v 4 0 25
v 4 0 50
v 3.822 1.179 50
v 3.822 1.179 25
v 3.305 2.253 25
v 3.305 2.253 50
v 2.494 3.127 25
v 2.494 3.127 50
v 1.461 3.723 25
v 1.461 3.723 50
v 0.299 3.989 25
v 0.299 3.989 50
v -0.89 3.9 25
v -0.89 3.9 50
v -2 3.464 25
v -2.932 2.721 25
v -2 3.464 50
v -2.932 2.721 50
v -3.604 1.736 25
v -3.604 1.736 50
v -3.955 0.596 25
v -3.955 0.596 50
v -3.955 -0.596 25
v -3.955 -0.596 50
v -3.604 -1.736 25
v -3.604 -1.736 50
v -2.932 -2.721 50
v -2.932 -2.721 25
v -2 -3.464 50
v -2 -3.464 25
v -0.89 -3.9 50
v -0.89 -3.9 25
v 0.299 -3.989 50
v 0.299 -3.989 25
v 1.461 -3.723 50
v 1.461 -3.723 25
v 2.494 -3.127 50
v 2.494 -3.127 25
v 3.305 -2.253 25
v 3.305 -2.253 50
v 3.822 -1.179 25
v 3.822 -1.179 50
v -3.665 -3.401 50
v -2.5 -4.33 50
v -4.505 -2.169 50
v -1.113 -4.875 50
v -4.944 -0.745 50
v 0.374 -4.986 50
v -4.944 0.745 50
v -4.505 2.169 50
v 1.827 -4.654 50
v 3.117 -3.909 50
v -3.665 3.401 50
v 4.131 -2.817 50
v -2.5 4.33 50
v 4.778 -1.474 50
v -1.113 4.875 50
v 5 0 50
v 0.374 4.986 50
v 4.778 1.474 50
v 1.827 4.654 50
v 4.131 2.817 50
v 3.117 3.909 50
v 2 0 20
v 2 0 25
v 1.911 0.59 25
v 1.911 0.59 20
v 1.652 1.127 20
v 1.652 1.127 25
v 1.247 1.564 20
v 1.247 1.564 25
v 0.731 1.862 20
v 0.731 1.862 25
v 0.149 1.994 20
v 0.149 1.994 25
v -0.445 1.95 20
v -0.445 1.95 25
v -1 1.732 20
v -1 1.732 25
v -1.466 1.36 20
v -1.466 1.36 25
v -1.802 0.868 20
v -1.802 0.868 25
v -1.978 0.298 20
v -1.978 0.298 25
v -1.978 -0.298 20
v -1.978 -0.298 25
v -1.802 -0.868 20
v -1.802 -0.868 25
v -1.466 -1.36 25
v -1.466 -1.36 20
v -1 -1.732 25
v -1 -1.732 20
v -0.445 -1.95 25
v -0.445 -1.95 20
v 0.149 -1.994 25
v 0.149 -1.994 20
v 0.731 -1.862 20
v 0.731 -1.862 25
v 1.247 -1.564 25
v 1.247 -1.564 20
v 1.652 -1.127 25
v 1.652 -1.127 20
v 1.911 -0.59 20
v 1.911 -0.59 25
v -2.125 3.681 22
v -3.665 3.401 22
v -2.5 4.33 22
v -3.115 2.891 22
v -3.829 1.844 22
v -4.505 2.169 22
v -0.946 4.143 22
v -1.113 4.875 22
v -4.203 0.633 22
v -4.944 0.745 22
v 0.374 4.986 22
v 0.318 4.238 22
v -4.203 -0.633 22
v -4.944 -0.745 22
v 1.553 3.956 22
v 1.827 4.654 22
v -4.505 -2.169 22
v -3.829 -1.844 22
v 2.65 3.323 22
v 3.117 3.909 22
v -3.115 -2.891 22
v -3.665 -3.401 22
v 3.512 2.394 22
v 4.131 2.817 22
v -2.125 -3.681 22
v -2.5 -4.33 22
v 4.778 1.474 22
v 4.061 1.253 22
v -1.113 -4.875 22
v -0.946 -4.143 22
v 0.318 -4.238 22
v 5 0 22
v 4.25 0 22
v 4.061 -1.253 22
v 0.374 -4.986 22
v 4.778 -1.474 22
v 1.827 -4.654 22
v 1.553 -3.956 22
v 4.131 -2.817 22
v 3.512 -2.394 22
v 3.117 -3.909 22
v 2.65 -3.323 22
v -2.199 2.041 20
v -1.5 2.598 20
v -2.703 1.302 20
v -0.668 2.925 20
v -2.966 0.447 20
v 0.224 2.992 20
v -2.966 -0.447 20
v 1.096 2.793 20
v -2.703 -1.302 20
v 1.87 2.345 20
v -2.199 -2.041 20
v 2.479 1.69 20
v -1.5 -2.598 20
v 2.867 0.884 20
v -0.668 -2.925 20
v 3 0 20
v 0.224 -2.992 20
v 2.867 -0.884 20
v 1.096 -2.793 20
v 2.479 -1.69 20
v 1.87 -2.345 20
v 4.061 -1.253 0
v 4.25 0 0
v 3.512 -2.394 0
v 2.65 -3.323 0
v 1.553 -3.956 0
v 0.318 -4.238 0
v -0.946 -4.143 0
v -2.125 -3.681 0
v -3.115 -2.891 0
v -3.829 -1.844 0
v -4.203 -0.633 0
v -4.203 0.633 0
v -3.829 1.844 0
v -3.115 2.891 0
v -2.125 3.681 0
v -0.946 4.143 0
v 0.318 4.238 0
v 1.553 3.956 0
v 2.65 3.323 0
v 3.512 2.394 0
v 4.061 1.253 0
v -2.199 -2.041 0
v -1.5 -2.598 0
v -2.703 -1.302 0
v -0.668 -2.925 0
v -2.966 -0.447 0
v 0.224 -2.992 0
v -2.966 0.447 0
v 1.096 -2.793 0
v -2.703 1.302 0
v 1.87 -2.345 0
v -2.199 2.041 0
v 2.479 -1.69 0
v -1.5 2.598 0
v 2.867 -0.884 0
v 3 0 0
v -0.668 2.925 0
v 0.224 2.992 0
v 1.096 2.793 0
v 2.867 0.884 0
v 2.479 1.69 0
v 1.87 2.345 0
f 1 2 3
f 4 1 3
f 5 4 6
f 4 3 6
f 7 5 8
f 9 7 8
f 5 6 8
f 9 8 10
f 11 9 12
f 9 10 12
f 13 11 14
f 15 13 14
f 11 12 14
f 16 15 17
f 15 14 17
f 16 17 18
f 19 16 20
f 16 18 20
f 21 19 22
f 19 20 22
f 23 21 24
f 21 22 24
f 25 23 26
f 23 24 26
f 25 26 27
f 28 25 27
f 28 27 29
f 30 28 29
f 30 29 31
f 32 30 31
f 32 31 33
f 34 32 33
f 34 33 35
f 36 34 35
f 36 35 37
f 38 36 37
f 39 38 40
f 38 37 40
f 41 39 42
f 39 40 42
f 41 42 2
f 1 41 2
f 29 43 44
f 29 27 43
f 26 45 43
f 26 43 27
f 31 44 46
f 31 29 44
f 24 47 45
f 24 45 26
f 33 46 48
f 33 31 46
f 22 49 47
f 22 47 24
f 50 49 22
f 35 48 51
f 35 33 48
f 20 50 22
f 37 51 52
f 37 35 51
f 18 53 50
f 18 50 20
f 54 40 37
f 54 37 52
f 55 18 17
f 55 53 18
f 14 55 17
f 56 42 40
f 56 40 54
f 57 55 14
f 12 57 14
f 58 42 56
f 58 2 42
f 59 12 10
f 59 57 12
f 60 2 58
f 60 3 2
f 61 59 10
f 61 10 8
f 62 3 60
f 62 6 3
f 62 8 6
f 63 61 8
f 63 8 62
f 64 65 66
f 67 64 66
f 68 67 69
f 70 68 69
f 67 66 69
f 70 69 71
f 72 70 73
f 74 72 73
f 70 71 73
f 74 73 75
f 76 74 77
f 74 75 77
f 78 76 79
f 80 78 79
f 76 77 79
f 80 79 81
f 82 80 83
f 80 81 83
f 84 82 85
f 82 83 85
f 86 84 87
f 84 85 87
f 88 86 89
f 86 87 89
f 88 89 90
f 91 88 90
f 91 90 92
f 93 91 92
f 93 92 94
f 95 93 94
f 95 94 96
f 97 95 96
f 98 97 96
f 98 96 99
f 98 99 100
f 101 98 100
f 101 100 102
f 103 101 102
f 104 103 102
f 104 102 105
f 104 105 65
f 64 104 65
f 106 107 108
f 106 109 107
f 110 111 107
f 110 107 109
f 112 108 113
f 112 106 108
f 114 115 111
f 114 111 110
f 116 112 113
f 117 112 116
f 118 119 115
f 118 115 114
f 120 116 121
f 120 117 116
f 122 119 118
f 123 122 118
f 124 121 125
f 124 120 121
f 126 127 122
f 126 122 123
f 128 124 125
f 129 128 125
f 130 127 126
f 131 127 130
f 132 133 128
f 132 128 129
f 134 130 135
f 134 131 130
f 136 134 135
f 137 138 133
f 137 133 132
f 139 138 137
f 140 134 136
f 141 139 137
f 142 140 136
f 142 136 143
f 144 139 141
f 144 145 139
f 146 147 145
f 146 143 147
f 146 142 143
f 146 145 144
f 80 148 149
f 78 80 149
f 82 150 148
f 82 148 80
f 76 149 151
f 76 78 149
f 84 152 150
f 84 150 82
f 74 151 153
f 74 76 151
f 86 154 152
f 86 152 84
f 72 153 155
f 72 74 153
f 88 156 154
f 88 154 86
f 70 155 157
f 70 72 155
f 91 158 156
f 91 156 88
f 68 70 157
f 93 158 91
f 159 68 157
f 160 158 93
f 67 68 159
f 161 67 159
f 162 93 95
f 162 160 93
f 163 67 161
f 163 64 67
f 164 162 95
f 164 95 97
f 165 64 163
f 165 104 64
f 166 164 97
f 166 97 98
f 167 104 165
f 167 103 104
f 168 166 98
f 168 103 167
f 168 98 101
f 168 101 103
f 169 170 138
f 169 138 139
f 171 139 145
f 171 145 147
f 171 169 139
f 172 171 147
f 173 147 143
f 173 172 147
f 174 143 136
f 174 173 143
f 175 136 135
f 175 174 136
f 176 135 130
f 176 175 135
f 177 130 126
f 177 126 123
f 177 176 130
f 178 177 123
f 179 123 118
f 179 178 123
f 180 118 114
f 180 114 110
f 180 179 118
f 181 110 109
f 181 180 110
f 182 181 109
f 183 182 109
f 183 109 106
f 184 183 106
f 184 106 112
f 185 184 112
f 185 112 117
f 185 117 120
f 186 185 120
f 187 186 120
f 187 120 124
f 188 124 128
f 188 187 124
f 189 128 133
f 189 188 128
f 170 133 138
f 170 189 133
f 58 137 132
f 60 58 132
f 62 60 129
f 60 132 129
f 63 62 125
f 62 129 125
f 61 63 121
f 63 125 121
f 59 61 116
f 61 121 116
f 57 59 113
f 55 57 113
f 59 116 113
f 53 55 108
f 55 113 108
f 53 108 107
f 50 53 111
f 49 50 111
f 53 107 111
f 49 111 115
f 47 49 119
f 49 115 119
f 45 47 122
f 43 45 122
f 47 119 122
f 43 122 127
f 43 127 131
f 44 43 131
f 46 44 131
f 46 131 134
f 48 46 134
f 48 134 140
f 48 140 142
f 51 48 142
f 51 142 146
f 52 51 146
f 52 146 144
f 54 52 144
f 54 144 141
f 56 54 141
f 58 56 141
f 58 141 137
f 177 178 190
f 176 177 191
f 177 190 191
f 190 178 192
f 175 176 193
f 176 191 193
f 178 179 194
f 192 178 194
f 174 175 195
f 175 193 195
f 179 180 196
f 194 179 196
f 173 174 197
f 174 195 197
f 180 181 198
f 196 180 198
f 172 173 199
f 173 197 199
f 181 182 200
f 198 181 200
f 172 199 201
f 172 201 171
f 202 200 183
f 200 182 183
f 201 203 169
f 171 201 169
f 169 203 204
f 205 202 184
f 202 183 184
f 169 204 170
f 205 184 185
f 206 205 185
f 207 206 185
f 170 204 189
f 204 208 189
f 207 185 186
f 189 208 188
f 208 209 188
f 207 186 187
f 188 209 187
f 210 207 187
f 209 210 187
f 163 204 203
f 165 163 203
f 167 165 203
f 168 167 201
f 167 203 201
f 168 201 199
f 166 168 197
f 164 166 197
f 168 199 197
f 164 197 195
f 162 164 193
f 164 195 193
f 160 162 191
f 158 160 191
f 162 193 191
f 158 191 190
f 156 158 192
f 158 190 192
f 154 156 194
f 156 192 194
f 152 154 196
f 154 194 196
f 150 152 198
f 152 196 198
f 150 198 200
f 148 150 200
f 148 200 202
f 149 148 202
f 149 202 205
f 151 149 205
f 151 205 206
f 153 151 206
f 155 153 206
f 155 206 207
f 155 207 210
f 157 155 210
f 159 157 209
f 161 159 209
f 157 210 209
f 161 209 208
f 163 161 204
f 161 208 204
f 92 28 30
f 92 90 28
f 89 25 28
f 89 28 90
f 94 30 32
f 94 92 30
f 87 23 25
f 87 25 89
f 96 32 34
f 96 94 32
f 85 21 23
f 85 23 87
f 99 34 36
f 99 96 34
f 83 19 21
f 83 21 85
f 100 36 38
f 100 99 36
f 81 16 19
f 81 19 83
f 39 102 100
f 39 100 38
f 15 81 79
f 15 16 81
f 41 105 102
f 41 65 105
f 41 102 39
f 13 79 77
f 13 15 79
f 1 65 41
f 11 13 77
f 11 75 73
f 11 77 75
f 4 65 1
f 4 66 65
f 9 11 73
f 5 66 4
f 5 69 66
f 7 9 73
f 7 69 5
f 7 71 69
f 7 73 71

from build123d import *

# Parameters (mm, degrees)
SKETCH_R        = 5
PAD_DEPTH       = 50
SKETCH001_R     = 2
POCKET_DEPTH    = 50.001
SKETCH002_R     = 4
POCKET001_DEPTH = 25
SKETCH003_R     = 3
POCKET002_DEPTH = 20
SKETCH004_R     = 5
SKETCH004_R_2   = 4.25
POCKET003_DEPTH = 22


with BuildPart() as part:
    # Sketch → Pad (new body)
    with BuildSketch(Plane.XY):
        Circle(SKETCH_R)
    extrude(amount=PAD_DEPTH)

    # Sketch001 → Pocket (cut, through all)
    with BuildSketch(Plane.XY.offset(50)):
        Circle(SKETCH001_R)
    extrude(amount=-POCKET_DEPTH, mode=Mode.SUBTRACT)

    # Sketch002 → Pocket001 (cut)
    with BuildSketch(Plane.XY.offset(50)):
        Circle(SKETCH002_R)
    extrude(amount=-POCKET001_DEPTH, mode=Mode.SUBTRACT)

    # Sketch003 → Pocket002 (cut)
    with BuildSketch(Plane(origin=(0, 0, 0), x_dir=(1, 0, 0), z_dir=(0, 0, -1))):
        Circle(SKETCH003_R)
    extrude(amount=-POCKET002_DEPTH, mode=Mode.SUBTRACT)

    # Sketch004 → Pocket003 (cut)
    with BuildSketch(Plane(origin=(0, 0, 0), x_dir=(1, 0, 0), z_dir=(0, 0, -1))):
        Circle(SKETCH004_R)
        Circle(SKETCH004_R_2, mode=Mode.SUBTRACT)
    extrude(amount=-POCKET003_DEPTH, mode=Mode.SUBTRACT)


solid = part.part
